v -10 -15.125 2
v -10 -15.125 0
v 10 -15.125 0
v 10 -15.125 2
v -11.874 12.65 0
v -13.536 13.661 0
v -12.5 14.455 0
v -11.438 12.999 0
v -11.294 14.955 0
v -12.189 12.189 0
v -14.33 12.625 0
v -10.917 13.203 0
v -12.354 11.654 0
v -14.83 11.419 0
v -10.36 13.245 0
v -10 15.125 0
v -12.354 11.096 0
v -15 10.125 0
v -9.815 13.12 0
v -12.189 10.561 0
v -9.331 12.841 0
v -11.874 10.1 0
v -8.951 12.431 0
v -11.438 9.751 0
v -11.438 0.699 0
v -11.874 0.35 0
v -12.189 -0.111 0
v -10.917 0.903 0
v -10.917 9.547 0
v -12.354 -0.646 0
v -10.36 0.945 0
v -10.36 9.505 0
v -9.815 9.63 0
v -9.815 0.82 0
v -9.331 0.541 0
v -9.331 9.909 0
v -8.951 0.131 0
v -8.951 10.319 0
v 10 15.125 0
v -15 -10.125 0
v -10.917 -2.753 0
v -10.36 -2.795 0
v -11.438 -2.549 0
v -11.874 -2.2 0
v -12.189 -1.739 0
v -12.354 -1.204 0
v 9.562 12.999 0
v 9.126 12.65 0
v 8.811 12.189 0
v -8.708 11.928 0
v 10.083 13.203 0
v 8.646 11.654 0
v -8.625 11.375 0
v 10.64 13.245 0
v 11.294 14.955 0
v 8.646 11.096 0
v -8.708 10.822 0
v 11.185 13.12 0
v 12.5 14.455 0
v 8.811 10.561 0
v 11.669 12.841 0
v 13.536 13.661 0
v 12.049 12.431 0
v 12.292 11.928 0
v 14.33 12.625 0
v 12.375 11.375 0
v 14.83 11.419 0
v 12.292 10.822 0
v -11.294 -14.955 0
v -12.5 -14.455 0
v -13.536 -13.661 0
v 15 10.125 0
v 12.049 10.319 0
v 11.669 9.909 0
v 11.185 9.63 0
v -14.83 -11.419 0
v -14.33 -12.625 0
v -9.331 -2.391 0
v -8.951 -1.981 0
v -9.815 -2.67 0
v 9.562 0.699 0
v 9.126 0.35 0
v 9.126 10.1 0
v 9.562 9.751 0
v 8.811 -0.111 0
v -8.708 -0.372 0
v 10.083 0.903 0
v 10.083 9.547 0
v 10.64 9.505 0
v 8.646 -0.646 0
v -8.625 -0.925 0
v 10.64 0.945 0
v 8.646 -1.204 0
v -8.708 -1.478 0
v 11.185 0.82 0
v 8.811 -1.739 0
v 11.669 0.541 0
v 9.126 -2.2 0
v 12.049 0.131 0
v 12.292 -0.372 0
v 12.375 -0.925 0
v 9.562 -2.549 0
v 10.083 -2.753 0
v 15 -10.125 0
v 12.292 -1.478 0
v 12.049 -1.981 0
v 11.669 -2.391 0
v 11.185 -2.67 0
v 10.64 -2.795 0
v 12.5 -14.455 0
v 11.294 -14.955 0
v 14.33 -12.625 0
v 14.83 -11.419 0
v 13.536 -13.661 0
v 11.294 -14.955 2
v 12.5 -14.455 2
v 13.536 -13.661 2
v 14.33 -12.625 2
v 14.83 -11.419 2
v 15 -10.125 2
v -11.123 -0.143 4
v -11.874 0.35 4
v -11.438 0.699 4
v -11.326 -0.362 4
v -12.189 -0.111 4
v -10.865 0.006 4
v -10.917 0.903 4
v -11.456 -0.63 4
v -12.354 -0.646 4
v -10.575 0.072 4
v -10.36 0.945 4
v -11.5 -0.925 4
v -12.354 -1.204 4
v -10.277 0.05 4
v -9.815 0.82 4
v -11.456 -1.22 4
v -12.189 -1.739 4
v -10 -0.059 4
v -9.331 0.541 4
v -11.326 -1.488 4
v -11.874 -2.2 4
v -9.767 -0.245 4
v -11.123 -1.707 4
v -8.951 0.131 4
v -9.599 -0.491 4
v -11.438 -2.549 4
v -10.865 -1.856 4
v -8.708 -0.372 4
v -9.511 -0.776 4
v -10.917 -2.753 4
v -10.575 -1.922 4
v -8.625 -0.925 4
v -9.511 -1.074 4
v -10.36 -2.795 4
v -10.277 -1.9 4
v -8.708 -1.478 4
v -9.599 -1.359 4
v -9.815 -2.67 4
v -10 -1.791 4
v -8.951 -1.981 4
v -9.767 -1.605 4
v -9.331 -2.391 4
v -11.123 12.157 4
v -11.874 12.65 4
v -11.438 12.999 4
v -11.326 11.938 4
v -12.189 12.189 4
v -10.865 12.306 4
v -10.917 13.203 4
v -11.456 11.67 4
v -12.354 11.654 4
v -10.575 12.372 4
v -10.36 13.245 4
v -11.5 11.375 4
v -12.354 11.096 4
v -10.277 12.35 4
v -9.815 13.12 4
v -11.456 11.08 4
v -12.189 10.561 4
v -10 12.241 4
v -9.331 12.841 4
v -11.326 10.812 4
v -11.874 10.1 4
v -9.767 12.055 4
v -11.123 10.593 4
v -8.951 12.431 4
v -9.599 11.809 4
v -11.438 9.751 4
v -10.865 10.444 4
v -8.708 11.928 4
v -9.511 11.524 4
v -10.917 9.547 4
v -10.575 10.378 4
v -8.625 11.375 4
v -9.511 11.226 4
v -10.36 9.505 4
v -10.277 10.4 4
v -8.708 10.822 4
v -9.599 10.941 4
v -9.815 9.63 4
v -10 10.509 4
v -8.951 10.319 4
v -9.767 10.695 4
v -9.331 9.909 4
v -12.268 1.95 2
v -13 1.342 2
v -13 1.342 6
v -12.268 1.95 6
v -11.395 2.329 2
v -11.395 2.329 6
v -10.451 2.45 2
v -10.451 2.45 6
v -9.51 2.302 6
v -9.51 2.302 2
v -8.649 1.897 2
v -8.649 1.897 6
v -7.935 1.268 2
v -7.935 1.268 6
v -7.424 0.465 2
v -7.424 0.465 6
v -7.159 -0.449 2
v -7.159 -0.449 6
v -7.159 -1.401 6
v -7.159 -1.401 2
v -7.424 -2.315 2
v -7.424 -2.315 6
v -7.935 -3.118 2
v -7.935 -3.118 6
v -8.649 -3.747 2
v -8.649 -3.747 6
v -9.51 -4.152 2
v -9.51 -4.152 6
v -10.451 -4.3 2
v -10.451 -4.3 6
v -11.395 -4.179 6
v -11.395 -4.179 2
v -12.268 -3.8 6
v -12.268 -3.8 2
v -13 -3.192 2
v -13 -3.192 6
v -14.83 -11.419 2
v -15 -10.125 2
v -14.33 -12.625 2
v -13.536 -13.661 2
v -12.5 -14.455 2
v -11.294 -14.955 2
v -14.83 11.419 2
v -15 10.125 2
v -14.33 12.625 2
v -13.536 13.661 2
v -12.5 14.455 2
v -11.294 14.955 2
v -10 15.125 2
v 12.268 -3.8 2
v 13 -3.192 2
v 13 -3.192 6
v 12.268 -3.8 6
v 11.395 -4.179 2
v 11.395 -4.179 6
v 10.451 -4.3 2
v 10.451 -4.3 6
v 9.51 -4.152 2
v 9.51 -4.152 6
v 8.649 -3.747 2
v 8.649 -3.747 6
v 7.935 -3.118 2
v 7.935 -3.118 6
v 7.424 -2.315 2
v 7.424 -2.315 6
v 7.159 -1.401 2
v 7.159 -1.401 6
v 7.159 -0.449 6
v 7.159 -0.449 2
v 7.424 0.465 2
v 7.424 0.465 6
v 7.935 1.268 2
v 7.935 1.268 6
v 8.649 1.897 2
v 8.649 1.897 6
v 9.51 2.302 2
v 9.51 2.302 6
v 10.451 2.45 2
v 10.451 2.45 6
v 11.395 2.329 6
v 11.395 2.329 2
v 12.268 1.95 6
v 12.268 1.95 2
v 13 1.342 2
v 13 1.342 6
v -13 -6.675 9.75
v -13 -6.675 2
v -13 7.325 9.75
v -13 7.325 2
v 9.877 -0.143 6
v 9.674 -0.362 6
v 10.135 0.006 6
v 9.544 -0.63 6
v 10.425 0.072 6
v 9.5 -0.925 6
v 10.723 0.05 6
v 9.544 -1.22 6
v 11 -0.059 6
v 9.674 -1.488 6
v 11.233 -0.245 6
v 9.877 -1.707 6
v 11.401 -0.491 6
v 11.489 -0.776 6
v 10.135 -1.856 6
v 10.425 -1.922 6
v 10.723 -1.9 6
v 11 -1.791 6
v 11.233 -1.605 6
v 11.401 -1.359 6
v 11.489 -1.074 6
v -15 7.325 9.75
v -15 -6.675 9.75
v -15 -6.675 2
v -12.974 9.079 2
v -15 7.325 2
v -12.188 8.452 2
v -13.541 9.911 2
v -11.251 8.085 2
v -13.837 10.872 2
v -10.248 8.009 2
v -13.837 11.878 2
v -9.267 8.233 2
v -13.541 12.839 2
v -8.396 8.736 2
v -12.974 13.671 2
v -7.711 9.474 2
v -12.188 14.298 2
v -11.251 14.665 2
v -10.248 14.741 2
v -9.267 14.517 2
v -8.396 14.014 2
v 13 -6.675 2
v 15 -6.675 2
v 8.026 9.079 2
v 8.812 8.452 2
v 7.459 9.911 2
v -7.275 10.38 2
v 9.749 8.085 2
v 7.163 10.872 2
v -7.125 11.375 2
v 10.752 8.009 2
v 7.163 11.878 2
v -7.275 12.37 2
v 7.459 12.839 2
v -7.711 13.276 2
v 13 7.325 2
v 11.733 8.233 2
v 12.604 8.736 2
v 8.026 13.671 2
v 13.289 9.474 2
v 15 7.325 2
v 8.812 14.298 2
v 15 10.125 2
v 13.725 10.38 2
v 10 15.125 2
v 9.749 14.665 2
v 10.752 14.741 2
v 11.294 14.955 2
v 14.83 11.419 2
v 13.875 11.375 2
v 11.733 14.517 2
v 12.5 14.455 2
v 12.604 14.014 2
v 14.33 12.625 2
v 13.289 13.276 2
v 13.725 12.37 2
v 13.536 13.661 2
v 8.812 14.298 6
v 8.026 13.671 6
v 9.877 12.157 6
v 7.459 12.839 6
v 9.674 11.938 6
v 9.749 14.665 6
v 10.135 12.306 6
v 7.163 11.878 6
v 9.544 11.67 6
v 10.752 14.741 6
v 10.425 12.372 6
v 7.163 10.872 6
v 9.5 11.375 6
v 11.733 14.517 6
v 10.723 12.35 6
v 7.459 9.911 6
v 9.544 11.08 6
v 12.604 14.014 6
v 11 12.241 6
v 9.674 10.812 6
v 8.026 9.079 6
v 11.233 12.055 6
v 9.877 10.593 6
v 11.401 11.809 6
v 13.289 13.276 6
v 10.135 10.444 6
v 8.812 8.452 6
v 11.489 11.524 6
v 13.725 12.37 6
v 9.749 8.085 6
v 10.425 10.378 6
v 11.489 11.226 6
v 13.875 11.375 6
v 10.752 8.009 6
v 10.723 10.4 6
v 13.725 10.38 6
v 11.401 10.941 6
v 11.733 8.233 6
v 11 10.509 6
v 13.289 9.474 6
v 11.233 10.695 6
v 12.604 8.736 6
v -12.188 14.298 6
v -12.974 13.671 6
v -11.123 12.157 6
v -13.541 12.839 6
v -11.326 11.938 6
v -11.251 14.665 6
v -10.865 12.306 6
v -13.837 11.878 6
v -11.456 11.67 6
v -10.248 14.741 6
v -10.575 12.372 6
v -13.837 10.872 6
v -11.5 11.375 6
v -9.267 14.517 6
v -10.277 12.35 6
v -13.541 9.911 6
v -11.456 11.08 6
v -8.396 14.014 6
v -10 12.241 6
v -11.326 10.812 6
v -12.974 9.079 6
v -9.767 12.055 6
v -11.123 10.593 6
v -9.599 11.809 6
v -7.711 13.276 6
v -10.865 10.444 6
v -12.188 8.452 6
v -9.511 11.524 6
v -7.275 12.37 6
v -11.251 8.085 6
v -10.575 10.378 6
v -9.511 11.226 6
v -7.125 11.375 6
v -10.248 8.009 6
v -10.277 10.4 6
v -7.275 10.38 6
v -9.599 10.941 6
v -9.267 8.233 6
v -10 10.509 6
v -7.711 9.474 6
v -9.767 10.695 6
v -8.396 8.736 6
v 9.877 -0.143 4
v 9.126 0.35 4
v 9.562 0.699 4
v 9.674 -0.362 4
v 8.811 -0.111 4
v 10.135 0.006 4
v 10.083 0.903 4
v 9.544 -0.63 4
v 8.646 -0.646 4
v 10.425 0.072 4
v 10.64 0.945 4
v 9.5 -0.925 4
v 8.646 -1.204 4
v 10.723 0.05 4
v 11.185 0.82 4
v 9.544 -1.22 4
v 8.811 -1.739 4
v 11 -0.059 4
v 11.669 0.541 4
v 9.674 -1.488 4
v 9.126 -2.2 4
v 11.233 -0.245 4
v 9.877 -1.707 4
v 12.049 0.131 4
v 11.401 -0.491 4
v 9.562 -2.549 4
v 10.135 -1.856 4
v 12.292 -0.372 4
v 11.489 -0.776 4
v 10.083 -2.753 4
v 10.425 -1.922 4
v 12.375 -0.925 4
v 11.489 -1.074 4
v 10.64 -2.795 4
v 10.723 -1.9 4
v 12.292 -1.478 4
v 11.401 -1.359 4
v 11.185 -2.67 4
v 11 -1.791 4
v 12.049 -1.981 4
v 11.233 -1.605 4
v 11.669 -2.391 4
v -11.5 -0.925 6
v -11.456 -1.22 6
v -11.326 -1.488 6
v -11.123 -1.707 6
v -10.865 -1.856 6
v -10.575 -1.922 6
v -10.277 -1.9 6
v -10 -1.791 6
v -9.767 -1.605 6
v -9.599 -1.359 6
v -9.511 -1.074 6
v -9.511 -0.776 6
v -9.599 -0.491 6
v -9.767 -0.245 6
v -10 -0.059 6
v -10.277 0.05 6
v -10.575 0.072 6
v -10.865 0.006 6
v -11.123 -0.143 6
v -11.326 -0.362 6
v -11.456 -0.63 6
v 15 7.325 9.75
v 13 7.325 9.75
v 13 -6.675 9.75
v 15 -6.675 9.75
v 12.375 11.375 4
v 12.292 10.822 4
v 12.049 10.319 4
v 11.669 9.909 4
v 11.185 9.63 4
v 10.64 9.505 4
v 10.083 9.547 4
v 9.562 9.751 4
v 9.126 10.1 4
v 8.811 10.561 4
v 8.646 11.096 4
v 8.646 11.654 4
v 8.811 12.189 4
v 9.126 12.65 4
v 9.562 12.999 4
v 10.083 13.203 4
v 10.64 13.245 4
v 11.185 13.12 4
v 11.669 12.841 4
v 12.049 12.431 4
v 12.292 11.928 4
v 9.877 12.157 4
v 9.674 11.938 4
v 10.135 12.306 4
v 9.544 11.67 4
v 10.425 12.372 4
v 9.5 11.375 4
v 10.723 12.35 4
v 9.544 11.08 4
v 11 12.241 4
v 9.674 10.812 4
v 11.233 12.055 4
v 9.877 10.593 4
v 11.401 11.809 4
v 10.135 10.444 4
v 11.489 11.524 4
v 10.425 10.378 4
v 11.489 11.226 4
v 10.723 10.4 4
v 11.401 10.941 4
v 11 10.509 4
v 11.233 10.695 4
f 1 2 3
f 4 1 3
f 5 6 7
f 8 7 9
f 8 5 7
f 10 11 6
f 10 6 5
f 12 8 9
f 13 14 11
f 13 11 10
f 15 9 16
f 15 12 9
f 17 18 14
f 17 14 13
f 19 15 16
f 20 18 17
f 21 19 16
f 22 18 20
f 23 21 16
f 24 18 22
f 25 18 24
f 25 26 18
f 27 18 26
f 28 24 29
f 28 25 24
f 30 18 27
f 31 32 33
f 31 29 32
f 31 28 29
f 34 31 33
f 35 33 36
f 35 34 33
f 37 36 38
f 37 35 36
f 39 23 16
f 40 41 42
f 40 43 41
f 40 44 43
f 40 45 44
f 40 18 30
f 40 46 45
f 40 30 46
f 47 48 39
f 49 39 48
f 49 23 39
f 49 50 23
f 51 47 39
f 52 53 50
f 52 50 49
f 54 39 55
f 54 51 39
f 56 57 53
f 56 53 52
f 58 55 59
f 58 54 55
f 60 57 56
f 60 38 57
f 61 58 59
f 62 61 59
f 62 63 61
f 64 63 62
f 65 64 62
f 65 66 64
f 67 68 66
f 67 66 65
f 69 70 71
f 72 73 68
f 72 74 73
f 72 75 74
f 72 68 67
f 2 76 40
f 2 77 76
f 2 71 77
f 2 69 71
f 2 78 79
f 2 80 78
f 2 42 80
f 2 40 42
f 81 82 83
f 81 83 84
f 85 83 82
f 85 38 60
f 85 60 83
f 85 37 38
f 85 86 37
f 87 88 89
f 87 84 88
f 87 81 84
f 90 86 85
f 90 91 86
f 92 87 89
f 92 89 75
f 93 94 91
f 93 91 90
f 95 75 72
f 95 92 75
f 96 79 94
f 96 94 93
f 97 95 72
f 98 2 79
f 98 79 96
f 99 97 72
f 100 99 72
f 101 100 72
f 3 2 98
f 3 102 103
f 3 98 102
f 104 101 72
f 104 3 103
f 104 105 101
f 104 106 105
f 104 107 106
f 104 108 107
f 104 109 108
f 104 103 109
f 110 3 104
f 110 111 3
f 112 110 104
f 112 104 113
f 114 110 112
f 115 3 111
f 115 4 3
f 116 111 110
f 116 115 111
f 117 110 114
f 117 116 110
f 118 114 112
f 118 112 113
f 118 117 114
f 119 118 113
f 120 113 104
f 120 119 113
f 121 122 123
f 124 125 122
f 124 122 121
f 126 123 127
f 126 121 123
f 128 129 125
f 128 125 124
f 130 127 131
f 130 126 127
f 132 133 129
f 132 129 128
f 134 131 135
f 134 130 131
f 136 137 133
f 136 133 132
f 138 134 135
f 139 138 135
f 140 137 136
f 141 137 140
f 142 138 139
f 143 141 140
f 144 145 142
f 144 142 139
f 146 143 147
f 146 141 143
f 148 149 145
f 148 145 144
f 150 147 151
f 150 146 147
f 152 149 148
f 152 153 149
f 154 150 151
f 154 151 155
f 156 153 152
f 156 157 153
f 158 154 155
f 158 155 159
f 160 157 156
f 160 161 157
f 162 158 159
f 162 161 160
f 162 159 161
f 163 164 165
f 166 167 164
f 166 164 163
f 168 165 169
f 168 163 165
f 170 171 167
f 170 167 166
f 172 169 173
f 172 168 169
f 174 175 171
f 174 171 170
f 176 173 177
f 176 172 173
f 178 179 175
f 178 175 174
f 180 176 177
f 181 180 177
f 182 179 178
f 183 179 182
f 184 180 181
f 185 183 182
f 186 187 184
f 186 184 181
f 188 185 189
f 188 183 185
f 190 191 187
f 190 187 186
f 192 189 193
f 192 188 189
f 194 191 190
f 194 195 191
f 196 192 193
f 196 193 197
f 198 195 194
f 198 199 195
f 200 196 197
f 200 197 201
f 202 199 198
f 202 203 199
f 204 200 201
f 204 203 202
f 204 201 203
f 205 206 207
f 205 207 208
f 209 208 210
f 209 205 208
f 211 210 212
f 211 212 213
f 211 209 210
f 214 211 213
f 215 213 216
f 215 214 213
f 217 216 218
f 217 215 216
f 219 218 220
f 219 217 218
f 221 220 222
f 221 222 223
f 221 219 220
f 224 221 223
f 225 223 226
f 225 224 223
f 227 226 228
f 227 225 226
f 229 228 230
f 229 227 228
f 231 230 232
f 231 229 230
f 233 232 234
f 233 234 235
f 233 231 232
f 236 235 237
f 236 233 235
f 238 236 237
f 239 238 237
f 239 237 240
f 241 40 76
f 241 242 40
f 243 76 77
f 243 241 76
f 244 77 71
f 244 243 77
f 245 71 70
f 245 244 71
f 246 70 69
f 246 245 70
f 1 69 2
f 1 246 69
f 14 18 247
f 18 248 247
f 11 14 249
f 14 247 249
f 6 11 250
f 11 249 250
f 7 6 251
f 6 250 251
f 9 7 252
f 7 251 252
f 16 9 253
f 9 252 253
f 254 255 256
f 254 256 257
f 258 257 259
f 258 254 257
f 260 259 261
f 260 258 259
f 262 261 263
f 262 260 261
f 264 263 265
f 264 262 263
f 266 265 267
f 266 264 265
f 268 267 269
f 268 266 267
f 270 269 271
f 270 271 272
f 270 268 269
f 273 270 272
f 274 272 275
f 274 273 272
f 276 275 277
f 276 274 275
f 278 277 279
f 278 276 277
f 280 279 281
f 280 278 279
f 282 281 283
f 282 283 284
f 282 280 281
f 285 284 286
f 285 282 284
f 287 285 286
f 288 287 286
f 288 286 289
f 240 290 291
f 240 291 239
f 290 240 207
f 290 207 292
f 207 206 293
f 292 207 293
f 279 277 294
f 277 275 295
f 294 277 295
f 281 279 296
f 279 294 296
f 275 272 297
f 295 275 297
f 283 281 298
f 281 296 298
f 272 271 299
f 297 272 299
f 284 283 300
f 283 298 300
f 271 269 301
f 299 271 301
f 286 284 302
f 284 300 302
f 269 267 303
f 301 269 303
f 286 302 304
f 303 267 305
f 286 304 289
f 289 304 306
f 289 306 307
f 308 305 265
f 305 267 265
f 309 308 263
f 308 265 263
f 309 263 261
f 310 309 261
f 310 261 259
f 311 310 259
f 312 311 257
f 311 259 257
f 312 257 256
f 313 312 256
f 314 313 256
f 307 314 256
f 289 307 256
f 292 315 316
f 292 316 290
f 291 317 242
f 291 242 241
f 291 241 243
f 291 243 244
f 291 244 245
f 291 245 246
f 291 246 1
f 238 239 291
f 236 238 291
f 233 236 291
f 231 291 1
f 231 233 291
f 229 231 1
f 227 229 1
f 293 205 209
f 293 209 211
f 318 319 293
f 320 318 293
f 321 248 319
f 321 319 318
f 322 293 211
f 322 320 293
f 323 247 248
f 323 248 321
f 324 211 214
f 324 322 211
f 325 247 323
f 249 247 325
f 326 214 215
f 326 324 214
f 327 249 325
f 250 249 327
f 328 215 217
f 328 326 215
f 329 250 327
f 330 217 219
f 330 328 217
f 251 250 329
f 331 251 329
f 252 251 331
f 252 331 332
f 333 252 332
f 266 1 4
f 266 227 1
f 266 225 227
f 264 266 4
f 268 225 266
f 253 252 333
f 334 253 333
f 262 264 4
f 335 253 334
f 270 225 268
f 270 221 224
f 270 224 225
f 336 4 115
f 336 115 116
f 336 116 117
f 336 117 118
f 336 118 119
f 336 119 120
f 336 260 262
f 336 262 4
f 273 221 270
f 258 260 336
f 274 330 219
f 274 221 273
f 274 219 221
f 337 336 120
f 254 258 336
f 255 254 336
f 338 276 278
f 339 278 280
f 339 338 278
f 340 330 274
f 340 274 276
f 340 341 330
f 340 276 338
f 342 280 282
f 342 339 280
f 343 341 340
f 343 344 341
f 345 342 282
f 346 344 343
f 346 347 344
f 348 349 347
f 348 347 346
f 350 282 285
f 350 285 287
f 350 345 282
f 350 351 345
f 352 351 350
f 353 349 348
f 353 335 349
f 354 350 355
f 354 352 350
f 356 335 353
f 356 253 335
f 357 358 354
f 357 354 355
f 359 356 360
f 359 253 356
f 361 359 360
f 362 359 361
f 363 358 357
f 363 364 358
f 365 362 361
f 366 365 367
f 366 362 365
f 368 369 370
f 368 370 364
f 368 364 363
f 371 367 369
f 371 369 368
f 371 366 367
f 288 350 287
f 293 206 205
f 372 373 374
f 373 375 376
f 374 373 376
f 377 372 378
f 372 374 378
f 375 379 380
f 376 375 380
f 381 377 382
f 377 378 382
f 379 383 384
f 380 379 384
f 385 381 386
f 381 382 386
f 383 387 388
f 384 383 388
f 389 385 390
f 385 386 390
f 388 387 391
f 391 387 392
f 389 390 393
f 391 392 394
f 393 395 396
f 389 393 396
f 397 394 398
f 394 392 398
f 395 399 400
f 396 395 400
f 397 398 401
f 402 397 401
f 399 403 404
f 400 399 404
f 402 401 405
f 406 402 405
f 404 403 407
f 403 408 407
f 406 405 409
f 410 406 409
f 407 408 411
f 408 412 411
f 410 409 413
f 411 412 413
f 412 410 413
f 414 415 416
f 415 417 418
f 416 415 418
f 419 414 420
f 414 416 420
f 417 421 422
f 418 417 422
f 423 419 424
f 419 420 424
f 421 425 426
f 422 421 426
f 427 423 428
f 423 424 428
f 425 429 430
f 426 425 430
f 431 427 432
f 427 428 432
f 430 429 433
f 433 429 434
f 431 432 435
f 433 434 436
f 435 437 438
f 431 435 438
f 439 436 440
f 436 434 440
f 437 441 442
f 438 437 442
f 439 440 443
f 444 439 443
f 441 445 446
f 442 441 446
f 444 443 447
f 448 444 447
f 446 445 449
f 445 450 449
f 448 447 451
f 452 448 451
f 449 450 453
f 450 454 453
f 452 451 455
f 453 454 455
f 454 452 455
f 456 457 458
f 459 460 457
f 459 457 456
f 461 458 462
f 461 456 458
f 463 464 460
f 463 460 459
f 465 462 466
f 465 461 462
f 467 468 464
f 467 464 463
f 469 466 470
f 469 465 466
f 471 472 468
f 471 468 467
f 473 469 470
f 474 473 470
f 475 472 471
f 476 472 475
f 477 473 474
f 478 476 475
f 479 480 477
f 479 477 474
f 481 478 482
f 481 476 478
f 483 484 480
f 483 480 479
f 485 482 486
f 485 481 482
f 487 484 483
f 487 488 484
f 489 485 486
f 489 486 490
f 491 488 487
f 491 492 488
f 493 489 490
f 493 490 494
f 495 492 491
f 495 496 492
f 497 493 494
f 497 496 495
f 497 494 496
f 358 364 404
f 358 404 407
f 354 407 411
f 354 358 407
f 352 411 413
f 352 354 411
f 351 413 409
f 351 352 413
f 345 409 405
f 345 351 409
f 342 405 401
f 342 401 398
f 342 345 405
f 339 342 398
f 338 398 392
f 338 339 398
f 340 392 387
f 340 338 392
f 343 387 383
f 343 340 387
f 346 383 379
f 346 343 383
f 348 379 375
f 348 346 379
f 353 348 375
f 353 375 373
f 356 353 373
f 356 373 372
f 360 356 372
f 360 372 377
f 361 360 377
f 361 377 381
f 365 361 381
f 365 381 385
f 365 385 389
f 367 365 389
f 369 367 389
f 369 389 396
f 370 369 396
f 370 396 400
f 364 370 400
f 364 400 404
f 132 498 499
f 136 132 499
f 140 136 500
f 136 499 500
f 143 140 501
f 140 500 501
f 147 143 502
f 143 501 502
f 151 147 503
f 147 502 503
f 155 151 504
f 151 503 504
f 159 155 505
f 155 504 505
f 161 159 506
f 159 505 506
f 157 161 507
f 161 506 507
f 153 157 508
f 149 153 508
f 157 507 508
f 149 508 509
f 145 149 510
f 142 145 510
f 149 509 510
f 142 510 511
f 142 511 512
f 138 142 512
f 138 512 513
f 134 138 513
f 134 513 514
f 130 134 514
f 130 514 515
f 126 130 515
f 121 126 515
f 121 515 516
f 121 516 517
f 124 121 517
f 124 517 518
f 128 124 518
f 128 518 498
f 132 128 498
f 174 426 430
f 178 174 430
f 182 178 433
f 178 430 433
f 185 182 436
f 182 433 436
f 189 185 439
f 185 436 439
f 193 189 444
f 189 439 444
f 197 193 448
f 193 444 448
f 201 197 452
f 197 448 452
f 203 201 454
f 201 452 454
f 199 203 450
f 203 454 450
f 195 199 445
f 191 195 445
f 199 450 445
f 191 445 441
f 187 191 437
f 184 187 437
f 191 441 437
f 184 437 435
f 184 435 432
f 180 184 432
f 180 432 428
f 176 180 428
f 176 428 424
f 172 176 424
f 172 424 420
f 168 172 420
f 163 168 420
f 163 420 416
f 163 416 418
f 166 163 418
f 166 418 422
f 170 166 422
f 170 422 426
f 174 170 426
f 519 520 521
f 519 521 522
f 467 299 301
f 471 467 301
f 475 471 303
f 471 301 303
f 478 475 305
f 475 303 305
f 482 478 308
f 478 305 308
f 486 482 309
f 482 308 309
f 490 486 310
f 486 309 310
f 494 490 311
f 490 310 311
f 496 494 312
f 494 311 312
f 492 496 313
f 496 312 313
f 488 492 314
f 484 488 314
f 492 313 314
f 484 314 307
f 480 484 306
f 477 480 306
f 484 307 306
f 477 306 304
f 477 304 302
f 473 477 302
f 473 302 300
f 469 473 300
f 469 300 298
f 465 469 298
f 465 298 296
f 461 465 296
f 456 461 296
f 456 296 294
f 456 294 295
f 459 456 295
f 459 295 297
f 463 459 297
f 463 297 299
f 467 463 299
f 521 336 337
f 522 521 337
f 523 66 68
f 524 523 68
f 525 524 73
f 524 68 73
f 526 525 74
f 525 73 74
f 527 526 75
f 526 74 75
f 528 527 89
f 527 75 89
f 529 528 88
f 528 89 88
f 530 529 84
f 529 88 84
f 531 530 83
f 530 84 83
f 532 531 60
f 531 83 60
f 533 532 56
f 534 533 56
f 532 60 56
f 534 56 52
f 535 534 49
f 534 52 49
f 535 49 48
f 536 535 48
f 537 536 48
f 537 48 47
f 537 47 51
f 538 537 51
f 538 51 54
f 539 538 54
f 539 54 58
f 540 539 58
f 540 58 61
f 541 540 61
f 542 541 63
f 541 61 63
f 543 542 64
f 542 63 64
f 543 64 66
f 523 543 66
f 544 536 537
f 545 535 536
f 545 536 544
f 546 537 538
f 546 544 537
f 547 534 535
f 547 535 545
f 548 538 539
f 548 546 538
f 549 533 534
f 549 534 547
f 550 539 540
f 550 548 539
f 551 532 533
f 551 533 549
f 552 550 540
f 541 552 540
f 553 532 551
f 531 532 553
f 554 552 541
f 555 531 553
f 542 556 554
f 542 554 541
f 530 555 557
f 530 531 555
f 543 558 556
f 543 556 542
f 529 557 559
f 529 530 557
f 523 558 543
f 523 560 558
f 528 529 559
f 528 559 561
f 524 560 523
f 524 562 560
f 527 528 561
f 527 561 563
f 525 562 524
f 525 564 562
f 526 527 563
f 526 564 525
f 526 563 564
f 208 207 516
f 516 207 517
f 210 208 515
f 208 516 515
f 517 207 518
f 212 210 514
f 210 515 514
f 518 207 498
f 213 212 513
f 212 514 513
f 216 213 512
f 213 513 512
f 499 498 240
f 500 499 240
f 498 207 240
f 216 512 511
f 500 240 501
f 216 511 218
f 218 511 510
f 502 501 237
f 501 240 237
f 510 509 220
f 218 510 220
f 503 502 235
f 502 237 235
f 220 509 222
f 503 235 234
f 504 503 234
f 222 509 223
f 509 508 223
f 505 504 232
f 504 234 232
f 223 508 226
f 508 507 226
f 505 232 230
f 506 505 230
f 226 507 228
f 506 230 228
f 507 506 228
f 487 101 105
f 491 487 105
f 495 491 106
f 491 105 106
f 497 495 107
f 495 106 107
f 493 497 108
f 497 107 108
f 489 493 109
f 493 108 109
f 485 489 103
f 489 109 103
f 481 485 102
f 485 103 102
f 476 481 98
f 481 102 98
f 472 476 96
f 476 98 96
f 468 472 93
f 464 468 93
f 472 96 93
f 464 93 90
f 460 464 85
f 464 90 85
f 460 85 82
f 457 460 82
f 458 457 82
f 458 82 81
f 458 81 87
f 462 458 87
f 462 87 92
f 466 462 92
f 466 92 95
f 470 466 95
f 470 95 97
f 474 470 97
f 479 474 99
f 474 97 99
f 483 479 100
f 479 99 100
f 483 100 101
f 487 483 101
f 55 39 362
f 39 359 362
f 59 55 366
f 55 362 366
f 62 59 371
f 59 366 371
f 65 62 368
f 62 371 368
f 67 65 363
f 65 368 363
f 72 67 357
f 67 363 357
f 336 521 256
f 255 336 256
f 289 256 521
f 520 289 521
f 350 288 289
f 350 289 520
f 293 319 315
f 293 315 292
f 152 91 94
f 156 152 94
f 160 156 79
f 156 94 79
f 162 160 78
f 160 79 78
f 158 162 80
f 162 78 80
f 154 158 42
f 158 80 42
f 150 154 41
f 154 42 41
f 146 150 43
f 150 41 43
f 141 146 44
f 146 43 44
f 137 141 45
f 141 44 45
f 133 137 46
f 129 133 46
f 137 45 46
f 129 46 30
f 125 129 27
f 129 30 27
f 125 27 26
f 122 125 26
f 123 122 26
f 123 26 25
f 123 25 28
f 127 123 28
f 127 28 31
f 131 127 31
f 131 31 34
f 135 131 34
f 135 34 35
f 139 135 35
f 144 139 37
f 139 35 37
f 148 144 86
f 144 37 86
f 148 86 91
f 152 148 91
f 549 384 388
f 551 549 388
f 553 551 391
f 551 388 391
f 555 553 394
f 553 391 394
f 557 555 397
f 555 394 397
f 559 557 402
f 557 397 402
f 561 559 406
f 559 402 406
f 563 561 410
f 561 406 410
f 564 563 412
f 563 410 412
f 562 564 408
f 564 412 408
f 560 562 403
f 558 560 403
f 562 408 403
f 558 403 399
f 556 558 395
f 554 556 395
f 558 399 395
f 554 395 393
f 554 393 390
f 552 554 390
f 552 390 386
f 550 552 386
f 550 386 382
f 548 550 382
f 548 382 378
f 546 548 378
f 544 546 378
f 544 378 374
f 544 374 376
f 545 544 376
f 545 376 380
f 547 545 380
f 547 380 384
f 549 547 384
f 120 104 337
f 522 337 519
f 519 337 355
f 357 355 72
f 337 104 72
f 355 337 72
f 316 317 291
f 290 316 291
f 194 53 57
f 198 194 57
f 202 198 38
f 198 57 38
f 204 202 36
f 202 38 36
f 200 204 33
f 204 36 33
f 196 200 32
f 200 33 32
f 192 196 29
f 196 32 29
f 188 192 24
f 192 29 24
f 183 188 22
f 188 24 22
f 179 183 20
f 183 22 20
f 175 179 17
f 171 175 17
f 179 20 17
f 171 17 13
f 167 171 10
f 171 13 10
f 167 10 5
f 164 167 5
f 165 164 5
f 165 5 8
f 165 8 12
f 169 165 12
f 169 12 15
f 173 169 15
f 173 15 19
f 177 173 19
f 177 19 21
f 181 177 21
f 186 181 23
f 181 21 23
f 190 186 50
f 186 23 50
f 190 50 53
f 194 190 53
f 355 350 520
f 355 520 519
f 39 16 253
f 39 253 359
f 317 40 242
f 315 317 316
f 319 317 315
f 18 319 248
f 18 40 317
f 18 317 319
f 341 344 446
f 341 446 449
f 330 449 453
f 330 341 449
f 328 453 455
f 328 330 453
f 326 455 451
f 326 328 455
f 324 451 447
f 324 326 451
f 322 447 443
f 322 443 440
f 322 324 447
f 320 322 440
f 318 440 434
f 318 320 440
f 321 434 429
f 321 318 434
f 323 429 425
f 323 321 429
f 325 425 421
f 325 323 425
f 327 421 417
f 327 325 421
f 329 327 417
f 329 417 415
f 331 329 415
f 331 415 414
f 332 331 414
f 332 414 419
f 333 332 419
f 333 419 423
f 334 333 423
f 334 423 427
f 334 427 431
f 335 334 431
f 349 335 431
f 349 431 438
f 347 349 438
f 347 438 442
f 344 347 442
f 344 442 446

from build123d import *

# Parameters (mm, degrees)
F0_W     = 30
F0_H     = 30.25
F1_DEPTH = 2
F2_W     = 2
F2_H     = 14
F3_DEPTH = 7.75
F5_R     = 3.375
F6_DEPTH = 6
F4_R     = 1.875
F7_DEPTH = 4
F9_D     = 2
F9_DEPTH = 4
F9_START = 4
F9_TIP   = 0.600860619
F10_R    = 5


with BuildPart() as f1:
    # F0 (on Top) → F1 (new body)
    with BuildSketch(Plane.XY):
        Rectangle(F0_W, F0_H)
    extrude(amount=F1_DEPTH)

    # F2 (on face) → F3 (join)
    with BuildSketch(Plane.XY.offset(2)):
        with Locations((-14, 0.325)):
            Rectangle(F2_W, F2_H)
        with Locations((14, 0.325)):
            Rectangle(F2_W, F2_H)
    extrude(amount=F3_DEPTH)

    # F5 (on face) → F6 (join)
    with BuildSketch(Plane(origin=(0, 0, 0), x_dir=(1, 0, 0), z_dir=(0, 0, -1))):
        with Locations((10.5, -11.375)):
            Circle(F5_R)
        with Locations((-10.5, -11.375)):
            Circle(F5_R)
        with Locations((-10.5, 0.925)):
            Circle(F5_R)
        with Locations((10.5, 0.925)):
            Circle(F5_R)
    extrude(amount=-F6_DEPTH)

    # F4 (on face) → F7 (cut)
    with BuildSketch(Plane(origin=(0, 0, 0), x_dir=(1, 0, 0), z_dir=(0, 0, -1))):
        with Locations((-10.5, -11.375)):
            Circle(F4_R)
        with Locations((-10.5, 0.925)):
            Circle(F4_R)
        with Locations((10.5, -11.375)):
            Circle(F4_R)
        with Locations((10.5, 0.925)):
            Circle(F4_R)
    extrude(amount=-F7_DEPTH, mode=Mode.SUBTRACT)

    # F9
    # its depths count from where the whole tool has entered the part; down to there all is cleared
    with Locations(Plane(origin=(0, 0, 0), x_dir=(1, 0, 0), z_dir=(0, 0, -1)).offset(-F9_START)):
        with Locations((-10.5, 0.925), (-10.5, -11.375), (10.5, -11.375), (10.5, 0.925)):
            Hole(F9_D / 2, depth=F9_DEPTH)
            with Locations((0, 0, -(F9_DEPTH + F9_TIP / 2))):  # 118° drill point
                Cone(0, F9_D / 2, F9_TIP, mode=Mode.SUBTRACT)

    # F10
    f10_edges = [f1.edges().sort_by_distance(p)[0] for p in [
        (-15, -15.125, 1),
        (15, -15.125, 1),
        (15, 15.125, 1),
        (-15, 15.125, 1),
    ]]
    fillet(f10_edges, radius=F10_R)


solid = f1.part
